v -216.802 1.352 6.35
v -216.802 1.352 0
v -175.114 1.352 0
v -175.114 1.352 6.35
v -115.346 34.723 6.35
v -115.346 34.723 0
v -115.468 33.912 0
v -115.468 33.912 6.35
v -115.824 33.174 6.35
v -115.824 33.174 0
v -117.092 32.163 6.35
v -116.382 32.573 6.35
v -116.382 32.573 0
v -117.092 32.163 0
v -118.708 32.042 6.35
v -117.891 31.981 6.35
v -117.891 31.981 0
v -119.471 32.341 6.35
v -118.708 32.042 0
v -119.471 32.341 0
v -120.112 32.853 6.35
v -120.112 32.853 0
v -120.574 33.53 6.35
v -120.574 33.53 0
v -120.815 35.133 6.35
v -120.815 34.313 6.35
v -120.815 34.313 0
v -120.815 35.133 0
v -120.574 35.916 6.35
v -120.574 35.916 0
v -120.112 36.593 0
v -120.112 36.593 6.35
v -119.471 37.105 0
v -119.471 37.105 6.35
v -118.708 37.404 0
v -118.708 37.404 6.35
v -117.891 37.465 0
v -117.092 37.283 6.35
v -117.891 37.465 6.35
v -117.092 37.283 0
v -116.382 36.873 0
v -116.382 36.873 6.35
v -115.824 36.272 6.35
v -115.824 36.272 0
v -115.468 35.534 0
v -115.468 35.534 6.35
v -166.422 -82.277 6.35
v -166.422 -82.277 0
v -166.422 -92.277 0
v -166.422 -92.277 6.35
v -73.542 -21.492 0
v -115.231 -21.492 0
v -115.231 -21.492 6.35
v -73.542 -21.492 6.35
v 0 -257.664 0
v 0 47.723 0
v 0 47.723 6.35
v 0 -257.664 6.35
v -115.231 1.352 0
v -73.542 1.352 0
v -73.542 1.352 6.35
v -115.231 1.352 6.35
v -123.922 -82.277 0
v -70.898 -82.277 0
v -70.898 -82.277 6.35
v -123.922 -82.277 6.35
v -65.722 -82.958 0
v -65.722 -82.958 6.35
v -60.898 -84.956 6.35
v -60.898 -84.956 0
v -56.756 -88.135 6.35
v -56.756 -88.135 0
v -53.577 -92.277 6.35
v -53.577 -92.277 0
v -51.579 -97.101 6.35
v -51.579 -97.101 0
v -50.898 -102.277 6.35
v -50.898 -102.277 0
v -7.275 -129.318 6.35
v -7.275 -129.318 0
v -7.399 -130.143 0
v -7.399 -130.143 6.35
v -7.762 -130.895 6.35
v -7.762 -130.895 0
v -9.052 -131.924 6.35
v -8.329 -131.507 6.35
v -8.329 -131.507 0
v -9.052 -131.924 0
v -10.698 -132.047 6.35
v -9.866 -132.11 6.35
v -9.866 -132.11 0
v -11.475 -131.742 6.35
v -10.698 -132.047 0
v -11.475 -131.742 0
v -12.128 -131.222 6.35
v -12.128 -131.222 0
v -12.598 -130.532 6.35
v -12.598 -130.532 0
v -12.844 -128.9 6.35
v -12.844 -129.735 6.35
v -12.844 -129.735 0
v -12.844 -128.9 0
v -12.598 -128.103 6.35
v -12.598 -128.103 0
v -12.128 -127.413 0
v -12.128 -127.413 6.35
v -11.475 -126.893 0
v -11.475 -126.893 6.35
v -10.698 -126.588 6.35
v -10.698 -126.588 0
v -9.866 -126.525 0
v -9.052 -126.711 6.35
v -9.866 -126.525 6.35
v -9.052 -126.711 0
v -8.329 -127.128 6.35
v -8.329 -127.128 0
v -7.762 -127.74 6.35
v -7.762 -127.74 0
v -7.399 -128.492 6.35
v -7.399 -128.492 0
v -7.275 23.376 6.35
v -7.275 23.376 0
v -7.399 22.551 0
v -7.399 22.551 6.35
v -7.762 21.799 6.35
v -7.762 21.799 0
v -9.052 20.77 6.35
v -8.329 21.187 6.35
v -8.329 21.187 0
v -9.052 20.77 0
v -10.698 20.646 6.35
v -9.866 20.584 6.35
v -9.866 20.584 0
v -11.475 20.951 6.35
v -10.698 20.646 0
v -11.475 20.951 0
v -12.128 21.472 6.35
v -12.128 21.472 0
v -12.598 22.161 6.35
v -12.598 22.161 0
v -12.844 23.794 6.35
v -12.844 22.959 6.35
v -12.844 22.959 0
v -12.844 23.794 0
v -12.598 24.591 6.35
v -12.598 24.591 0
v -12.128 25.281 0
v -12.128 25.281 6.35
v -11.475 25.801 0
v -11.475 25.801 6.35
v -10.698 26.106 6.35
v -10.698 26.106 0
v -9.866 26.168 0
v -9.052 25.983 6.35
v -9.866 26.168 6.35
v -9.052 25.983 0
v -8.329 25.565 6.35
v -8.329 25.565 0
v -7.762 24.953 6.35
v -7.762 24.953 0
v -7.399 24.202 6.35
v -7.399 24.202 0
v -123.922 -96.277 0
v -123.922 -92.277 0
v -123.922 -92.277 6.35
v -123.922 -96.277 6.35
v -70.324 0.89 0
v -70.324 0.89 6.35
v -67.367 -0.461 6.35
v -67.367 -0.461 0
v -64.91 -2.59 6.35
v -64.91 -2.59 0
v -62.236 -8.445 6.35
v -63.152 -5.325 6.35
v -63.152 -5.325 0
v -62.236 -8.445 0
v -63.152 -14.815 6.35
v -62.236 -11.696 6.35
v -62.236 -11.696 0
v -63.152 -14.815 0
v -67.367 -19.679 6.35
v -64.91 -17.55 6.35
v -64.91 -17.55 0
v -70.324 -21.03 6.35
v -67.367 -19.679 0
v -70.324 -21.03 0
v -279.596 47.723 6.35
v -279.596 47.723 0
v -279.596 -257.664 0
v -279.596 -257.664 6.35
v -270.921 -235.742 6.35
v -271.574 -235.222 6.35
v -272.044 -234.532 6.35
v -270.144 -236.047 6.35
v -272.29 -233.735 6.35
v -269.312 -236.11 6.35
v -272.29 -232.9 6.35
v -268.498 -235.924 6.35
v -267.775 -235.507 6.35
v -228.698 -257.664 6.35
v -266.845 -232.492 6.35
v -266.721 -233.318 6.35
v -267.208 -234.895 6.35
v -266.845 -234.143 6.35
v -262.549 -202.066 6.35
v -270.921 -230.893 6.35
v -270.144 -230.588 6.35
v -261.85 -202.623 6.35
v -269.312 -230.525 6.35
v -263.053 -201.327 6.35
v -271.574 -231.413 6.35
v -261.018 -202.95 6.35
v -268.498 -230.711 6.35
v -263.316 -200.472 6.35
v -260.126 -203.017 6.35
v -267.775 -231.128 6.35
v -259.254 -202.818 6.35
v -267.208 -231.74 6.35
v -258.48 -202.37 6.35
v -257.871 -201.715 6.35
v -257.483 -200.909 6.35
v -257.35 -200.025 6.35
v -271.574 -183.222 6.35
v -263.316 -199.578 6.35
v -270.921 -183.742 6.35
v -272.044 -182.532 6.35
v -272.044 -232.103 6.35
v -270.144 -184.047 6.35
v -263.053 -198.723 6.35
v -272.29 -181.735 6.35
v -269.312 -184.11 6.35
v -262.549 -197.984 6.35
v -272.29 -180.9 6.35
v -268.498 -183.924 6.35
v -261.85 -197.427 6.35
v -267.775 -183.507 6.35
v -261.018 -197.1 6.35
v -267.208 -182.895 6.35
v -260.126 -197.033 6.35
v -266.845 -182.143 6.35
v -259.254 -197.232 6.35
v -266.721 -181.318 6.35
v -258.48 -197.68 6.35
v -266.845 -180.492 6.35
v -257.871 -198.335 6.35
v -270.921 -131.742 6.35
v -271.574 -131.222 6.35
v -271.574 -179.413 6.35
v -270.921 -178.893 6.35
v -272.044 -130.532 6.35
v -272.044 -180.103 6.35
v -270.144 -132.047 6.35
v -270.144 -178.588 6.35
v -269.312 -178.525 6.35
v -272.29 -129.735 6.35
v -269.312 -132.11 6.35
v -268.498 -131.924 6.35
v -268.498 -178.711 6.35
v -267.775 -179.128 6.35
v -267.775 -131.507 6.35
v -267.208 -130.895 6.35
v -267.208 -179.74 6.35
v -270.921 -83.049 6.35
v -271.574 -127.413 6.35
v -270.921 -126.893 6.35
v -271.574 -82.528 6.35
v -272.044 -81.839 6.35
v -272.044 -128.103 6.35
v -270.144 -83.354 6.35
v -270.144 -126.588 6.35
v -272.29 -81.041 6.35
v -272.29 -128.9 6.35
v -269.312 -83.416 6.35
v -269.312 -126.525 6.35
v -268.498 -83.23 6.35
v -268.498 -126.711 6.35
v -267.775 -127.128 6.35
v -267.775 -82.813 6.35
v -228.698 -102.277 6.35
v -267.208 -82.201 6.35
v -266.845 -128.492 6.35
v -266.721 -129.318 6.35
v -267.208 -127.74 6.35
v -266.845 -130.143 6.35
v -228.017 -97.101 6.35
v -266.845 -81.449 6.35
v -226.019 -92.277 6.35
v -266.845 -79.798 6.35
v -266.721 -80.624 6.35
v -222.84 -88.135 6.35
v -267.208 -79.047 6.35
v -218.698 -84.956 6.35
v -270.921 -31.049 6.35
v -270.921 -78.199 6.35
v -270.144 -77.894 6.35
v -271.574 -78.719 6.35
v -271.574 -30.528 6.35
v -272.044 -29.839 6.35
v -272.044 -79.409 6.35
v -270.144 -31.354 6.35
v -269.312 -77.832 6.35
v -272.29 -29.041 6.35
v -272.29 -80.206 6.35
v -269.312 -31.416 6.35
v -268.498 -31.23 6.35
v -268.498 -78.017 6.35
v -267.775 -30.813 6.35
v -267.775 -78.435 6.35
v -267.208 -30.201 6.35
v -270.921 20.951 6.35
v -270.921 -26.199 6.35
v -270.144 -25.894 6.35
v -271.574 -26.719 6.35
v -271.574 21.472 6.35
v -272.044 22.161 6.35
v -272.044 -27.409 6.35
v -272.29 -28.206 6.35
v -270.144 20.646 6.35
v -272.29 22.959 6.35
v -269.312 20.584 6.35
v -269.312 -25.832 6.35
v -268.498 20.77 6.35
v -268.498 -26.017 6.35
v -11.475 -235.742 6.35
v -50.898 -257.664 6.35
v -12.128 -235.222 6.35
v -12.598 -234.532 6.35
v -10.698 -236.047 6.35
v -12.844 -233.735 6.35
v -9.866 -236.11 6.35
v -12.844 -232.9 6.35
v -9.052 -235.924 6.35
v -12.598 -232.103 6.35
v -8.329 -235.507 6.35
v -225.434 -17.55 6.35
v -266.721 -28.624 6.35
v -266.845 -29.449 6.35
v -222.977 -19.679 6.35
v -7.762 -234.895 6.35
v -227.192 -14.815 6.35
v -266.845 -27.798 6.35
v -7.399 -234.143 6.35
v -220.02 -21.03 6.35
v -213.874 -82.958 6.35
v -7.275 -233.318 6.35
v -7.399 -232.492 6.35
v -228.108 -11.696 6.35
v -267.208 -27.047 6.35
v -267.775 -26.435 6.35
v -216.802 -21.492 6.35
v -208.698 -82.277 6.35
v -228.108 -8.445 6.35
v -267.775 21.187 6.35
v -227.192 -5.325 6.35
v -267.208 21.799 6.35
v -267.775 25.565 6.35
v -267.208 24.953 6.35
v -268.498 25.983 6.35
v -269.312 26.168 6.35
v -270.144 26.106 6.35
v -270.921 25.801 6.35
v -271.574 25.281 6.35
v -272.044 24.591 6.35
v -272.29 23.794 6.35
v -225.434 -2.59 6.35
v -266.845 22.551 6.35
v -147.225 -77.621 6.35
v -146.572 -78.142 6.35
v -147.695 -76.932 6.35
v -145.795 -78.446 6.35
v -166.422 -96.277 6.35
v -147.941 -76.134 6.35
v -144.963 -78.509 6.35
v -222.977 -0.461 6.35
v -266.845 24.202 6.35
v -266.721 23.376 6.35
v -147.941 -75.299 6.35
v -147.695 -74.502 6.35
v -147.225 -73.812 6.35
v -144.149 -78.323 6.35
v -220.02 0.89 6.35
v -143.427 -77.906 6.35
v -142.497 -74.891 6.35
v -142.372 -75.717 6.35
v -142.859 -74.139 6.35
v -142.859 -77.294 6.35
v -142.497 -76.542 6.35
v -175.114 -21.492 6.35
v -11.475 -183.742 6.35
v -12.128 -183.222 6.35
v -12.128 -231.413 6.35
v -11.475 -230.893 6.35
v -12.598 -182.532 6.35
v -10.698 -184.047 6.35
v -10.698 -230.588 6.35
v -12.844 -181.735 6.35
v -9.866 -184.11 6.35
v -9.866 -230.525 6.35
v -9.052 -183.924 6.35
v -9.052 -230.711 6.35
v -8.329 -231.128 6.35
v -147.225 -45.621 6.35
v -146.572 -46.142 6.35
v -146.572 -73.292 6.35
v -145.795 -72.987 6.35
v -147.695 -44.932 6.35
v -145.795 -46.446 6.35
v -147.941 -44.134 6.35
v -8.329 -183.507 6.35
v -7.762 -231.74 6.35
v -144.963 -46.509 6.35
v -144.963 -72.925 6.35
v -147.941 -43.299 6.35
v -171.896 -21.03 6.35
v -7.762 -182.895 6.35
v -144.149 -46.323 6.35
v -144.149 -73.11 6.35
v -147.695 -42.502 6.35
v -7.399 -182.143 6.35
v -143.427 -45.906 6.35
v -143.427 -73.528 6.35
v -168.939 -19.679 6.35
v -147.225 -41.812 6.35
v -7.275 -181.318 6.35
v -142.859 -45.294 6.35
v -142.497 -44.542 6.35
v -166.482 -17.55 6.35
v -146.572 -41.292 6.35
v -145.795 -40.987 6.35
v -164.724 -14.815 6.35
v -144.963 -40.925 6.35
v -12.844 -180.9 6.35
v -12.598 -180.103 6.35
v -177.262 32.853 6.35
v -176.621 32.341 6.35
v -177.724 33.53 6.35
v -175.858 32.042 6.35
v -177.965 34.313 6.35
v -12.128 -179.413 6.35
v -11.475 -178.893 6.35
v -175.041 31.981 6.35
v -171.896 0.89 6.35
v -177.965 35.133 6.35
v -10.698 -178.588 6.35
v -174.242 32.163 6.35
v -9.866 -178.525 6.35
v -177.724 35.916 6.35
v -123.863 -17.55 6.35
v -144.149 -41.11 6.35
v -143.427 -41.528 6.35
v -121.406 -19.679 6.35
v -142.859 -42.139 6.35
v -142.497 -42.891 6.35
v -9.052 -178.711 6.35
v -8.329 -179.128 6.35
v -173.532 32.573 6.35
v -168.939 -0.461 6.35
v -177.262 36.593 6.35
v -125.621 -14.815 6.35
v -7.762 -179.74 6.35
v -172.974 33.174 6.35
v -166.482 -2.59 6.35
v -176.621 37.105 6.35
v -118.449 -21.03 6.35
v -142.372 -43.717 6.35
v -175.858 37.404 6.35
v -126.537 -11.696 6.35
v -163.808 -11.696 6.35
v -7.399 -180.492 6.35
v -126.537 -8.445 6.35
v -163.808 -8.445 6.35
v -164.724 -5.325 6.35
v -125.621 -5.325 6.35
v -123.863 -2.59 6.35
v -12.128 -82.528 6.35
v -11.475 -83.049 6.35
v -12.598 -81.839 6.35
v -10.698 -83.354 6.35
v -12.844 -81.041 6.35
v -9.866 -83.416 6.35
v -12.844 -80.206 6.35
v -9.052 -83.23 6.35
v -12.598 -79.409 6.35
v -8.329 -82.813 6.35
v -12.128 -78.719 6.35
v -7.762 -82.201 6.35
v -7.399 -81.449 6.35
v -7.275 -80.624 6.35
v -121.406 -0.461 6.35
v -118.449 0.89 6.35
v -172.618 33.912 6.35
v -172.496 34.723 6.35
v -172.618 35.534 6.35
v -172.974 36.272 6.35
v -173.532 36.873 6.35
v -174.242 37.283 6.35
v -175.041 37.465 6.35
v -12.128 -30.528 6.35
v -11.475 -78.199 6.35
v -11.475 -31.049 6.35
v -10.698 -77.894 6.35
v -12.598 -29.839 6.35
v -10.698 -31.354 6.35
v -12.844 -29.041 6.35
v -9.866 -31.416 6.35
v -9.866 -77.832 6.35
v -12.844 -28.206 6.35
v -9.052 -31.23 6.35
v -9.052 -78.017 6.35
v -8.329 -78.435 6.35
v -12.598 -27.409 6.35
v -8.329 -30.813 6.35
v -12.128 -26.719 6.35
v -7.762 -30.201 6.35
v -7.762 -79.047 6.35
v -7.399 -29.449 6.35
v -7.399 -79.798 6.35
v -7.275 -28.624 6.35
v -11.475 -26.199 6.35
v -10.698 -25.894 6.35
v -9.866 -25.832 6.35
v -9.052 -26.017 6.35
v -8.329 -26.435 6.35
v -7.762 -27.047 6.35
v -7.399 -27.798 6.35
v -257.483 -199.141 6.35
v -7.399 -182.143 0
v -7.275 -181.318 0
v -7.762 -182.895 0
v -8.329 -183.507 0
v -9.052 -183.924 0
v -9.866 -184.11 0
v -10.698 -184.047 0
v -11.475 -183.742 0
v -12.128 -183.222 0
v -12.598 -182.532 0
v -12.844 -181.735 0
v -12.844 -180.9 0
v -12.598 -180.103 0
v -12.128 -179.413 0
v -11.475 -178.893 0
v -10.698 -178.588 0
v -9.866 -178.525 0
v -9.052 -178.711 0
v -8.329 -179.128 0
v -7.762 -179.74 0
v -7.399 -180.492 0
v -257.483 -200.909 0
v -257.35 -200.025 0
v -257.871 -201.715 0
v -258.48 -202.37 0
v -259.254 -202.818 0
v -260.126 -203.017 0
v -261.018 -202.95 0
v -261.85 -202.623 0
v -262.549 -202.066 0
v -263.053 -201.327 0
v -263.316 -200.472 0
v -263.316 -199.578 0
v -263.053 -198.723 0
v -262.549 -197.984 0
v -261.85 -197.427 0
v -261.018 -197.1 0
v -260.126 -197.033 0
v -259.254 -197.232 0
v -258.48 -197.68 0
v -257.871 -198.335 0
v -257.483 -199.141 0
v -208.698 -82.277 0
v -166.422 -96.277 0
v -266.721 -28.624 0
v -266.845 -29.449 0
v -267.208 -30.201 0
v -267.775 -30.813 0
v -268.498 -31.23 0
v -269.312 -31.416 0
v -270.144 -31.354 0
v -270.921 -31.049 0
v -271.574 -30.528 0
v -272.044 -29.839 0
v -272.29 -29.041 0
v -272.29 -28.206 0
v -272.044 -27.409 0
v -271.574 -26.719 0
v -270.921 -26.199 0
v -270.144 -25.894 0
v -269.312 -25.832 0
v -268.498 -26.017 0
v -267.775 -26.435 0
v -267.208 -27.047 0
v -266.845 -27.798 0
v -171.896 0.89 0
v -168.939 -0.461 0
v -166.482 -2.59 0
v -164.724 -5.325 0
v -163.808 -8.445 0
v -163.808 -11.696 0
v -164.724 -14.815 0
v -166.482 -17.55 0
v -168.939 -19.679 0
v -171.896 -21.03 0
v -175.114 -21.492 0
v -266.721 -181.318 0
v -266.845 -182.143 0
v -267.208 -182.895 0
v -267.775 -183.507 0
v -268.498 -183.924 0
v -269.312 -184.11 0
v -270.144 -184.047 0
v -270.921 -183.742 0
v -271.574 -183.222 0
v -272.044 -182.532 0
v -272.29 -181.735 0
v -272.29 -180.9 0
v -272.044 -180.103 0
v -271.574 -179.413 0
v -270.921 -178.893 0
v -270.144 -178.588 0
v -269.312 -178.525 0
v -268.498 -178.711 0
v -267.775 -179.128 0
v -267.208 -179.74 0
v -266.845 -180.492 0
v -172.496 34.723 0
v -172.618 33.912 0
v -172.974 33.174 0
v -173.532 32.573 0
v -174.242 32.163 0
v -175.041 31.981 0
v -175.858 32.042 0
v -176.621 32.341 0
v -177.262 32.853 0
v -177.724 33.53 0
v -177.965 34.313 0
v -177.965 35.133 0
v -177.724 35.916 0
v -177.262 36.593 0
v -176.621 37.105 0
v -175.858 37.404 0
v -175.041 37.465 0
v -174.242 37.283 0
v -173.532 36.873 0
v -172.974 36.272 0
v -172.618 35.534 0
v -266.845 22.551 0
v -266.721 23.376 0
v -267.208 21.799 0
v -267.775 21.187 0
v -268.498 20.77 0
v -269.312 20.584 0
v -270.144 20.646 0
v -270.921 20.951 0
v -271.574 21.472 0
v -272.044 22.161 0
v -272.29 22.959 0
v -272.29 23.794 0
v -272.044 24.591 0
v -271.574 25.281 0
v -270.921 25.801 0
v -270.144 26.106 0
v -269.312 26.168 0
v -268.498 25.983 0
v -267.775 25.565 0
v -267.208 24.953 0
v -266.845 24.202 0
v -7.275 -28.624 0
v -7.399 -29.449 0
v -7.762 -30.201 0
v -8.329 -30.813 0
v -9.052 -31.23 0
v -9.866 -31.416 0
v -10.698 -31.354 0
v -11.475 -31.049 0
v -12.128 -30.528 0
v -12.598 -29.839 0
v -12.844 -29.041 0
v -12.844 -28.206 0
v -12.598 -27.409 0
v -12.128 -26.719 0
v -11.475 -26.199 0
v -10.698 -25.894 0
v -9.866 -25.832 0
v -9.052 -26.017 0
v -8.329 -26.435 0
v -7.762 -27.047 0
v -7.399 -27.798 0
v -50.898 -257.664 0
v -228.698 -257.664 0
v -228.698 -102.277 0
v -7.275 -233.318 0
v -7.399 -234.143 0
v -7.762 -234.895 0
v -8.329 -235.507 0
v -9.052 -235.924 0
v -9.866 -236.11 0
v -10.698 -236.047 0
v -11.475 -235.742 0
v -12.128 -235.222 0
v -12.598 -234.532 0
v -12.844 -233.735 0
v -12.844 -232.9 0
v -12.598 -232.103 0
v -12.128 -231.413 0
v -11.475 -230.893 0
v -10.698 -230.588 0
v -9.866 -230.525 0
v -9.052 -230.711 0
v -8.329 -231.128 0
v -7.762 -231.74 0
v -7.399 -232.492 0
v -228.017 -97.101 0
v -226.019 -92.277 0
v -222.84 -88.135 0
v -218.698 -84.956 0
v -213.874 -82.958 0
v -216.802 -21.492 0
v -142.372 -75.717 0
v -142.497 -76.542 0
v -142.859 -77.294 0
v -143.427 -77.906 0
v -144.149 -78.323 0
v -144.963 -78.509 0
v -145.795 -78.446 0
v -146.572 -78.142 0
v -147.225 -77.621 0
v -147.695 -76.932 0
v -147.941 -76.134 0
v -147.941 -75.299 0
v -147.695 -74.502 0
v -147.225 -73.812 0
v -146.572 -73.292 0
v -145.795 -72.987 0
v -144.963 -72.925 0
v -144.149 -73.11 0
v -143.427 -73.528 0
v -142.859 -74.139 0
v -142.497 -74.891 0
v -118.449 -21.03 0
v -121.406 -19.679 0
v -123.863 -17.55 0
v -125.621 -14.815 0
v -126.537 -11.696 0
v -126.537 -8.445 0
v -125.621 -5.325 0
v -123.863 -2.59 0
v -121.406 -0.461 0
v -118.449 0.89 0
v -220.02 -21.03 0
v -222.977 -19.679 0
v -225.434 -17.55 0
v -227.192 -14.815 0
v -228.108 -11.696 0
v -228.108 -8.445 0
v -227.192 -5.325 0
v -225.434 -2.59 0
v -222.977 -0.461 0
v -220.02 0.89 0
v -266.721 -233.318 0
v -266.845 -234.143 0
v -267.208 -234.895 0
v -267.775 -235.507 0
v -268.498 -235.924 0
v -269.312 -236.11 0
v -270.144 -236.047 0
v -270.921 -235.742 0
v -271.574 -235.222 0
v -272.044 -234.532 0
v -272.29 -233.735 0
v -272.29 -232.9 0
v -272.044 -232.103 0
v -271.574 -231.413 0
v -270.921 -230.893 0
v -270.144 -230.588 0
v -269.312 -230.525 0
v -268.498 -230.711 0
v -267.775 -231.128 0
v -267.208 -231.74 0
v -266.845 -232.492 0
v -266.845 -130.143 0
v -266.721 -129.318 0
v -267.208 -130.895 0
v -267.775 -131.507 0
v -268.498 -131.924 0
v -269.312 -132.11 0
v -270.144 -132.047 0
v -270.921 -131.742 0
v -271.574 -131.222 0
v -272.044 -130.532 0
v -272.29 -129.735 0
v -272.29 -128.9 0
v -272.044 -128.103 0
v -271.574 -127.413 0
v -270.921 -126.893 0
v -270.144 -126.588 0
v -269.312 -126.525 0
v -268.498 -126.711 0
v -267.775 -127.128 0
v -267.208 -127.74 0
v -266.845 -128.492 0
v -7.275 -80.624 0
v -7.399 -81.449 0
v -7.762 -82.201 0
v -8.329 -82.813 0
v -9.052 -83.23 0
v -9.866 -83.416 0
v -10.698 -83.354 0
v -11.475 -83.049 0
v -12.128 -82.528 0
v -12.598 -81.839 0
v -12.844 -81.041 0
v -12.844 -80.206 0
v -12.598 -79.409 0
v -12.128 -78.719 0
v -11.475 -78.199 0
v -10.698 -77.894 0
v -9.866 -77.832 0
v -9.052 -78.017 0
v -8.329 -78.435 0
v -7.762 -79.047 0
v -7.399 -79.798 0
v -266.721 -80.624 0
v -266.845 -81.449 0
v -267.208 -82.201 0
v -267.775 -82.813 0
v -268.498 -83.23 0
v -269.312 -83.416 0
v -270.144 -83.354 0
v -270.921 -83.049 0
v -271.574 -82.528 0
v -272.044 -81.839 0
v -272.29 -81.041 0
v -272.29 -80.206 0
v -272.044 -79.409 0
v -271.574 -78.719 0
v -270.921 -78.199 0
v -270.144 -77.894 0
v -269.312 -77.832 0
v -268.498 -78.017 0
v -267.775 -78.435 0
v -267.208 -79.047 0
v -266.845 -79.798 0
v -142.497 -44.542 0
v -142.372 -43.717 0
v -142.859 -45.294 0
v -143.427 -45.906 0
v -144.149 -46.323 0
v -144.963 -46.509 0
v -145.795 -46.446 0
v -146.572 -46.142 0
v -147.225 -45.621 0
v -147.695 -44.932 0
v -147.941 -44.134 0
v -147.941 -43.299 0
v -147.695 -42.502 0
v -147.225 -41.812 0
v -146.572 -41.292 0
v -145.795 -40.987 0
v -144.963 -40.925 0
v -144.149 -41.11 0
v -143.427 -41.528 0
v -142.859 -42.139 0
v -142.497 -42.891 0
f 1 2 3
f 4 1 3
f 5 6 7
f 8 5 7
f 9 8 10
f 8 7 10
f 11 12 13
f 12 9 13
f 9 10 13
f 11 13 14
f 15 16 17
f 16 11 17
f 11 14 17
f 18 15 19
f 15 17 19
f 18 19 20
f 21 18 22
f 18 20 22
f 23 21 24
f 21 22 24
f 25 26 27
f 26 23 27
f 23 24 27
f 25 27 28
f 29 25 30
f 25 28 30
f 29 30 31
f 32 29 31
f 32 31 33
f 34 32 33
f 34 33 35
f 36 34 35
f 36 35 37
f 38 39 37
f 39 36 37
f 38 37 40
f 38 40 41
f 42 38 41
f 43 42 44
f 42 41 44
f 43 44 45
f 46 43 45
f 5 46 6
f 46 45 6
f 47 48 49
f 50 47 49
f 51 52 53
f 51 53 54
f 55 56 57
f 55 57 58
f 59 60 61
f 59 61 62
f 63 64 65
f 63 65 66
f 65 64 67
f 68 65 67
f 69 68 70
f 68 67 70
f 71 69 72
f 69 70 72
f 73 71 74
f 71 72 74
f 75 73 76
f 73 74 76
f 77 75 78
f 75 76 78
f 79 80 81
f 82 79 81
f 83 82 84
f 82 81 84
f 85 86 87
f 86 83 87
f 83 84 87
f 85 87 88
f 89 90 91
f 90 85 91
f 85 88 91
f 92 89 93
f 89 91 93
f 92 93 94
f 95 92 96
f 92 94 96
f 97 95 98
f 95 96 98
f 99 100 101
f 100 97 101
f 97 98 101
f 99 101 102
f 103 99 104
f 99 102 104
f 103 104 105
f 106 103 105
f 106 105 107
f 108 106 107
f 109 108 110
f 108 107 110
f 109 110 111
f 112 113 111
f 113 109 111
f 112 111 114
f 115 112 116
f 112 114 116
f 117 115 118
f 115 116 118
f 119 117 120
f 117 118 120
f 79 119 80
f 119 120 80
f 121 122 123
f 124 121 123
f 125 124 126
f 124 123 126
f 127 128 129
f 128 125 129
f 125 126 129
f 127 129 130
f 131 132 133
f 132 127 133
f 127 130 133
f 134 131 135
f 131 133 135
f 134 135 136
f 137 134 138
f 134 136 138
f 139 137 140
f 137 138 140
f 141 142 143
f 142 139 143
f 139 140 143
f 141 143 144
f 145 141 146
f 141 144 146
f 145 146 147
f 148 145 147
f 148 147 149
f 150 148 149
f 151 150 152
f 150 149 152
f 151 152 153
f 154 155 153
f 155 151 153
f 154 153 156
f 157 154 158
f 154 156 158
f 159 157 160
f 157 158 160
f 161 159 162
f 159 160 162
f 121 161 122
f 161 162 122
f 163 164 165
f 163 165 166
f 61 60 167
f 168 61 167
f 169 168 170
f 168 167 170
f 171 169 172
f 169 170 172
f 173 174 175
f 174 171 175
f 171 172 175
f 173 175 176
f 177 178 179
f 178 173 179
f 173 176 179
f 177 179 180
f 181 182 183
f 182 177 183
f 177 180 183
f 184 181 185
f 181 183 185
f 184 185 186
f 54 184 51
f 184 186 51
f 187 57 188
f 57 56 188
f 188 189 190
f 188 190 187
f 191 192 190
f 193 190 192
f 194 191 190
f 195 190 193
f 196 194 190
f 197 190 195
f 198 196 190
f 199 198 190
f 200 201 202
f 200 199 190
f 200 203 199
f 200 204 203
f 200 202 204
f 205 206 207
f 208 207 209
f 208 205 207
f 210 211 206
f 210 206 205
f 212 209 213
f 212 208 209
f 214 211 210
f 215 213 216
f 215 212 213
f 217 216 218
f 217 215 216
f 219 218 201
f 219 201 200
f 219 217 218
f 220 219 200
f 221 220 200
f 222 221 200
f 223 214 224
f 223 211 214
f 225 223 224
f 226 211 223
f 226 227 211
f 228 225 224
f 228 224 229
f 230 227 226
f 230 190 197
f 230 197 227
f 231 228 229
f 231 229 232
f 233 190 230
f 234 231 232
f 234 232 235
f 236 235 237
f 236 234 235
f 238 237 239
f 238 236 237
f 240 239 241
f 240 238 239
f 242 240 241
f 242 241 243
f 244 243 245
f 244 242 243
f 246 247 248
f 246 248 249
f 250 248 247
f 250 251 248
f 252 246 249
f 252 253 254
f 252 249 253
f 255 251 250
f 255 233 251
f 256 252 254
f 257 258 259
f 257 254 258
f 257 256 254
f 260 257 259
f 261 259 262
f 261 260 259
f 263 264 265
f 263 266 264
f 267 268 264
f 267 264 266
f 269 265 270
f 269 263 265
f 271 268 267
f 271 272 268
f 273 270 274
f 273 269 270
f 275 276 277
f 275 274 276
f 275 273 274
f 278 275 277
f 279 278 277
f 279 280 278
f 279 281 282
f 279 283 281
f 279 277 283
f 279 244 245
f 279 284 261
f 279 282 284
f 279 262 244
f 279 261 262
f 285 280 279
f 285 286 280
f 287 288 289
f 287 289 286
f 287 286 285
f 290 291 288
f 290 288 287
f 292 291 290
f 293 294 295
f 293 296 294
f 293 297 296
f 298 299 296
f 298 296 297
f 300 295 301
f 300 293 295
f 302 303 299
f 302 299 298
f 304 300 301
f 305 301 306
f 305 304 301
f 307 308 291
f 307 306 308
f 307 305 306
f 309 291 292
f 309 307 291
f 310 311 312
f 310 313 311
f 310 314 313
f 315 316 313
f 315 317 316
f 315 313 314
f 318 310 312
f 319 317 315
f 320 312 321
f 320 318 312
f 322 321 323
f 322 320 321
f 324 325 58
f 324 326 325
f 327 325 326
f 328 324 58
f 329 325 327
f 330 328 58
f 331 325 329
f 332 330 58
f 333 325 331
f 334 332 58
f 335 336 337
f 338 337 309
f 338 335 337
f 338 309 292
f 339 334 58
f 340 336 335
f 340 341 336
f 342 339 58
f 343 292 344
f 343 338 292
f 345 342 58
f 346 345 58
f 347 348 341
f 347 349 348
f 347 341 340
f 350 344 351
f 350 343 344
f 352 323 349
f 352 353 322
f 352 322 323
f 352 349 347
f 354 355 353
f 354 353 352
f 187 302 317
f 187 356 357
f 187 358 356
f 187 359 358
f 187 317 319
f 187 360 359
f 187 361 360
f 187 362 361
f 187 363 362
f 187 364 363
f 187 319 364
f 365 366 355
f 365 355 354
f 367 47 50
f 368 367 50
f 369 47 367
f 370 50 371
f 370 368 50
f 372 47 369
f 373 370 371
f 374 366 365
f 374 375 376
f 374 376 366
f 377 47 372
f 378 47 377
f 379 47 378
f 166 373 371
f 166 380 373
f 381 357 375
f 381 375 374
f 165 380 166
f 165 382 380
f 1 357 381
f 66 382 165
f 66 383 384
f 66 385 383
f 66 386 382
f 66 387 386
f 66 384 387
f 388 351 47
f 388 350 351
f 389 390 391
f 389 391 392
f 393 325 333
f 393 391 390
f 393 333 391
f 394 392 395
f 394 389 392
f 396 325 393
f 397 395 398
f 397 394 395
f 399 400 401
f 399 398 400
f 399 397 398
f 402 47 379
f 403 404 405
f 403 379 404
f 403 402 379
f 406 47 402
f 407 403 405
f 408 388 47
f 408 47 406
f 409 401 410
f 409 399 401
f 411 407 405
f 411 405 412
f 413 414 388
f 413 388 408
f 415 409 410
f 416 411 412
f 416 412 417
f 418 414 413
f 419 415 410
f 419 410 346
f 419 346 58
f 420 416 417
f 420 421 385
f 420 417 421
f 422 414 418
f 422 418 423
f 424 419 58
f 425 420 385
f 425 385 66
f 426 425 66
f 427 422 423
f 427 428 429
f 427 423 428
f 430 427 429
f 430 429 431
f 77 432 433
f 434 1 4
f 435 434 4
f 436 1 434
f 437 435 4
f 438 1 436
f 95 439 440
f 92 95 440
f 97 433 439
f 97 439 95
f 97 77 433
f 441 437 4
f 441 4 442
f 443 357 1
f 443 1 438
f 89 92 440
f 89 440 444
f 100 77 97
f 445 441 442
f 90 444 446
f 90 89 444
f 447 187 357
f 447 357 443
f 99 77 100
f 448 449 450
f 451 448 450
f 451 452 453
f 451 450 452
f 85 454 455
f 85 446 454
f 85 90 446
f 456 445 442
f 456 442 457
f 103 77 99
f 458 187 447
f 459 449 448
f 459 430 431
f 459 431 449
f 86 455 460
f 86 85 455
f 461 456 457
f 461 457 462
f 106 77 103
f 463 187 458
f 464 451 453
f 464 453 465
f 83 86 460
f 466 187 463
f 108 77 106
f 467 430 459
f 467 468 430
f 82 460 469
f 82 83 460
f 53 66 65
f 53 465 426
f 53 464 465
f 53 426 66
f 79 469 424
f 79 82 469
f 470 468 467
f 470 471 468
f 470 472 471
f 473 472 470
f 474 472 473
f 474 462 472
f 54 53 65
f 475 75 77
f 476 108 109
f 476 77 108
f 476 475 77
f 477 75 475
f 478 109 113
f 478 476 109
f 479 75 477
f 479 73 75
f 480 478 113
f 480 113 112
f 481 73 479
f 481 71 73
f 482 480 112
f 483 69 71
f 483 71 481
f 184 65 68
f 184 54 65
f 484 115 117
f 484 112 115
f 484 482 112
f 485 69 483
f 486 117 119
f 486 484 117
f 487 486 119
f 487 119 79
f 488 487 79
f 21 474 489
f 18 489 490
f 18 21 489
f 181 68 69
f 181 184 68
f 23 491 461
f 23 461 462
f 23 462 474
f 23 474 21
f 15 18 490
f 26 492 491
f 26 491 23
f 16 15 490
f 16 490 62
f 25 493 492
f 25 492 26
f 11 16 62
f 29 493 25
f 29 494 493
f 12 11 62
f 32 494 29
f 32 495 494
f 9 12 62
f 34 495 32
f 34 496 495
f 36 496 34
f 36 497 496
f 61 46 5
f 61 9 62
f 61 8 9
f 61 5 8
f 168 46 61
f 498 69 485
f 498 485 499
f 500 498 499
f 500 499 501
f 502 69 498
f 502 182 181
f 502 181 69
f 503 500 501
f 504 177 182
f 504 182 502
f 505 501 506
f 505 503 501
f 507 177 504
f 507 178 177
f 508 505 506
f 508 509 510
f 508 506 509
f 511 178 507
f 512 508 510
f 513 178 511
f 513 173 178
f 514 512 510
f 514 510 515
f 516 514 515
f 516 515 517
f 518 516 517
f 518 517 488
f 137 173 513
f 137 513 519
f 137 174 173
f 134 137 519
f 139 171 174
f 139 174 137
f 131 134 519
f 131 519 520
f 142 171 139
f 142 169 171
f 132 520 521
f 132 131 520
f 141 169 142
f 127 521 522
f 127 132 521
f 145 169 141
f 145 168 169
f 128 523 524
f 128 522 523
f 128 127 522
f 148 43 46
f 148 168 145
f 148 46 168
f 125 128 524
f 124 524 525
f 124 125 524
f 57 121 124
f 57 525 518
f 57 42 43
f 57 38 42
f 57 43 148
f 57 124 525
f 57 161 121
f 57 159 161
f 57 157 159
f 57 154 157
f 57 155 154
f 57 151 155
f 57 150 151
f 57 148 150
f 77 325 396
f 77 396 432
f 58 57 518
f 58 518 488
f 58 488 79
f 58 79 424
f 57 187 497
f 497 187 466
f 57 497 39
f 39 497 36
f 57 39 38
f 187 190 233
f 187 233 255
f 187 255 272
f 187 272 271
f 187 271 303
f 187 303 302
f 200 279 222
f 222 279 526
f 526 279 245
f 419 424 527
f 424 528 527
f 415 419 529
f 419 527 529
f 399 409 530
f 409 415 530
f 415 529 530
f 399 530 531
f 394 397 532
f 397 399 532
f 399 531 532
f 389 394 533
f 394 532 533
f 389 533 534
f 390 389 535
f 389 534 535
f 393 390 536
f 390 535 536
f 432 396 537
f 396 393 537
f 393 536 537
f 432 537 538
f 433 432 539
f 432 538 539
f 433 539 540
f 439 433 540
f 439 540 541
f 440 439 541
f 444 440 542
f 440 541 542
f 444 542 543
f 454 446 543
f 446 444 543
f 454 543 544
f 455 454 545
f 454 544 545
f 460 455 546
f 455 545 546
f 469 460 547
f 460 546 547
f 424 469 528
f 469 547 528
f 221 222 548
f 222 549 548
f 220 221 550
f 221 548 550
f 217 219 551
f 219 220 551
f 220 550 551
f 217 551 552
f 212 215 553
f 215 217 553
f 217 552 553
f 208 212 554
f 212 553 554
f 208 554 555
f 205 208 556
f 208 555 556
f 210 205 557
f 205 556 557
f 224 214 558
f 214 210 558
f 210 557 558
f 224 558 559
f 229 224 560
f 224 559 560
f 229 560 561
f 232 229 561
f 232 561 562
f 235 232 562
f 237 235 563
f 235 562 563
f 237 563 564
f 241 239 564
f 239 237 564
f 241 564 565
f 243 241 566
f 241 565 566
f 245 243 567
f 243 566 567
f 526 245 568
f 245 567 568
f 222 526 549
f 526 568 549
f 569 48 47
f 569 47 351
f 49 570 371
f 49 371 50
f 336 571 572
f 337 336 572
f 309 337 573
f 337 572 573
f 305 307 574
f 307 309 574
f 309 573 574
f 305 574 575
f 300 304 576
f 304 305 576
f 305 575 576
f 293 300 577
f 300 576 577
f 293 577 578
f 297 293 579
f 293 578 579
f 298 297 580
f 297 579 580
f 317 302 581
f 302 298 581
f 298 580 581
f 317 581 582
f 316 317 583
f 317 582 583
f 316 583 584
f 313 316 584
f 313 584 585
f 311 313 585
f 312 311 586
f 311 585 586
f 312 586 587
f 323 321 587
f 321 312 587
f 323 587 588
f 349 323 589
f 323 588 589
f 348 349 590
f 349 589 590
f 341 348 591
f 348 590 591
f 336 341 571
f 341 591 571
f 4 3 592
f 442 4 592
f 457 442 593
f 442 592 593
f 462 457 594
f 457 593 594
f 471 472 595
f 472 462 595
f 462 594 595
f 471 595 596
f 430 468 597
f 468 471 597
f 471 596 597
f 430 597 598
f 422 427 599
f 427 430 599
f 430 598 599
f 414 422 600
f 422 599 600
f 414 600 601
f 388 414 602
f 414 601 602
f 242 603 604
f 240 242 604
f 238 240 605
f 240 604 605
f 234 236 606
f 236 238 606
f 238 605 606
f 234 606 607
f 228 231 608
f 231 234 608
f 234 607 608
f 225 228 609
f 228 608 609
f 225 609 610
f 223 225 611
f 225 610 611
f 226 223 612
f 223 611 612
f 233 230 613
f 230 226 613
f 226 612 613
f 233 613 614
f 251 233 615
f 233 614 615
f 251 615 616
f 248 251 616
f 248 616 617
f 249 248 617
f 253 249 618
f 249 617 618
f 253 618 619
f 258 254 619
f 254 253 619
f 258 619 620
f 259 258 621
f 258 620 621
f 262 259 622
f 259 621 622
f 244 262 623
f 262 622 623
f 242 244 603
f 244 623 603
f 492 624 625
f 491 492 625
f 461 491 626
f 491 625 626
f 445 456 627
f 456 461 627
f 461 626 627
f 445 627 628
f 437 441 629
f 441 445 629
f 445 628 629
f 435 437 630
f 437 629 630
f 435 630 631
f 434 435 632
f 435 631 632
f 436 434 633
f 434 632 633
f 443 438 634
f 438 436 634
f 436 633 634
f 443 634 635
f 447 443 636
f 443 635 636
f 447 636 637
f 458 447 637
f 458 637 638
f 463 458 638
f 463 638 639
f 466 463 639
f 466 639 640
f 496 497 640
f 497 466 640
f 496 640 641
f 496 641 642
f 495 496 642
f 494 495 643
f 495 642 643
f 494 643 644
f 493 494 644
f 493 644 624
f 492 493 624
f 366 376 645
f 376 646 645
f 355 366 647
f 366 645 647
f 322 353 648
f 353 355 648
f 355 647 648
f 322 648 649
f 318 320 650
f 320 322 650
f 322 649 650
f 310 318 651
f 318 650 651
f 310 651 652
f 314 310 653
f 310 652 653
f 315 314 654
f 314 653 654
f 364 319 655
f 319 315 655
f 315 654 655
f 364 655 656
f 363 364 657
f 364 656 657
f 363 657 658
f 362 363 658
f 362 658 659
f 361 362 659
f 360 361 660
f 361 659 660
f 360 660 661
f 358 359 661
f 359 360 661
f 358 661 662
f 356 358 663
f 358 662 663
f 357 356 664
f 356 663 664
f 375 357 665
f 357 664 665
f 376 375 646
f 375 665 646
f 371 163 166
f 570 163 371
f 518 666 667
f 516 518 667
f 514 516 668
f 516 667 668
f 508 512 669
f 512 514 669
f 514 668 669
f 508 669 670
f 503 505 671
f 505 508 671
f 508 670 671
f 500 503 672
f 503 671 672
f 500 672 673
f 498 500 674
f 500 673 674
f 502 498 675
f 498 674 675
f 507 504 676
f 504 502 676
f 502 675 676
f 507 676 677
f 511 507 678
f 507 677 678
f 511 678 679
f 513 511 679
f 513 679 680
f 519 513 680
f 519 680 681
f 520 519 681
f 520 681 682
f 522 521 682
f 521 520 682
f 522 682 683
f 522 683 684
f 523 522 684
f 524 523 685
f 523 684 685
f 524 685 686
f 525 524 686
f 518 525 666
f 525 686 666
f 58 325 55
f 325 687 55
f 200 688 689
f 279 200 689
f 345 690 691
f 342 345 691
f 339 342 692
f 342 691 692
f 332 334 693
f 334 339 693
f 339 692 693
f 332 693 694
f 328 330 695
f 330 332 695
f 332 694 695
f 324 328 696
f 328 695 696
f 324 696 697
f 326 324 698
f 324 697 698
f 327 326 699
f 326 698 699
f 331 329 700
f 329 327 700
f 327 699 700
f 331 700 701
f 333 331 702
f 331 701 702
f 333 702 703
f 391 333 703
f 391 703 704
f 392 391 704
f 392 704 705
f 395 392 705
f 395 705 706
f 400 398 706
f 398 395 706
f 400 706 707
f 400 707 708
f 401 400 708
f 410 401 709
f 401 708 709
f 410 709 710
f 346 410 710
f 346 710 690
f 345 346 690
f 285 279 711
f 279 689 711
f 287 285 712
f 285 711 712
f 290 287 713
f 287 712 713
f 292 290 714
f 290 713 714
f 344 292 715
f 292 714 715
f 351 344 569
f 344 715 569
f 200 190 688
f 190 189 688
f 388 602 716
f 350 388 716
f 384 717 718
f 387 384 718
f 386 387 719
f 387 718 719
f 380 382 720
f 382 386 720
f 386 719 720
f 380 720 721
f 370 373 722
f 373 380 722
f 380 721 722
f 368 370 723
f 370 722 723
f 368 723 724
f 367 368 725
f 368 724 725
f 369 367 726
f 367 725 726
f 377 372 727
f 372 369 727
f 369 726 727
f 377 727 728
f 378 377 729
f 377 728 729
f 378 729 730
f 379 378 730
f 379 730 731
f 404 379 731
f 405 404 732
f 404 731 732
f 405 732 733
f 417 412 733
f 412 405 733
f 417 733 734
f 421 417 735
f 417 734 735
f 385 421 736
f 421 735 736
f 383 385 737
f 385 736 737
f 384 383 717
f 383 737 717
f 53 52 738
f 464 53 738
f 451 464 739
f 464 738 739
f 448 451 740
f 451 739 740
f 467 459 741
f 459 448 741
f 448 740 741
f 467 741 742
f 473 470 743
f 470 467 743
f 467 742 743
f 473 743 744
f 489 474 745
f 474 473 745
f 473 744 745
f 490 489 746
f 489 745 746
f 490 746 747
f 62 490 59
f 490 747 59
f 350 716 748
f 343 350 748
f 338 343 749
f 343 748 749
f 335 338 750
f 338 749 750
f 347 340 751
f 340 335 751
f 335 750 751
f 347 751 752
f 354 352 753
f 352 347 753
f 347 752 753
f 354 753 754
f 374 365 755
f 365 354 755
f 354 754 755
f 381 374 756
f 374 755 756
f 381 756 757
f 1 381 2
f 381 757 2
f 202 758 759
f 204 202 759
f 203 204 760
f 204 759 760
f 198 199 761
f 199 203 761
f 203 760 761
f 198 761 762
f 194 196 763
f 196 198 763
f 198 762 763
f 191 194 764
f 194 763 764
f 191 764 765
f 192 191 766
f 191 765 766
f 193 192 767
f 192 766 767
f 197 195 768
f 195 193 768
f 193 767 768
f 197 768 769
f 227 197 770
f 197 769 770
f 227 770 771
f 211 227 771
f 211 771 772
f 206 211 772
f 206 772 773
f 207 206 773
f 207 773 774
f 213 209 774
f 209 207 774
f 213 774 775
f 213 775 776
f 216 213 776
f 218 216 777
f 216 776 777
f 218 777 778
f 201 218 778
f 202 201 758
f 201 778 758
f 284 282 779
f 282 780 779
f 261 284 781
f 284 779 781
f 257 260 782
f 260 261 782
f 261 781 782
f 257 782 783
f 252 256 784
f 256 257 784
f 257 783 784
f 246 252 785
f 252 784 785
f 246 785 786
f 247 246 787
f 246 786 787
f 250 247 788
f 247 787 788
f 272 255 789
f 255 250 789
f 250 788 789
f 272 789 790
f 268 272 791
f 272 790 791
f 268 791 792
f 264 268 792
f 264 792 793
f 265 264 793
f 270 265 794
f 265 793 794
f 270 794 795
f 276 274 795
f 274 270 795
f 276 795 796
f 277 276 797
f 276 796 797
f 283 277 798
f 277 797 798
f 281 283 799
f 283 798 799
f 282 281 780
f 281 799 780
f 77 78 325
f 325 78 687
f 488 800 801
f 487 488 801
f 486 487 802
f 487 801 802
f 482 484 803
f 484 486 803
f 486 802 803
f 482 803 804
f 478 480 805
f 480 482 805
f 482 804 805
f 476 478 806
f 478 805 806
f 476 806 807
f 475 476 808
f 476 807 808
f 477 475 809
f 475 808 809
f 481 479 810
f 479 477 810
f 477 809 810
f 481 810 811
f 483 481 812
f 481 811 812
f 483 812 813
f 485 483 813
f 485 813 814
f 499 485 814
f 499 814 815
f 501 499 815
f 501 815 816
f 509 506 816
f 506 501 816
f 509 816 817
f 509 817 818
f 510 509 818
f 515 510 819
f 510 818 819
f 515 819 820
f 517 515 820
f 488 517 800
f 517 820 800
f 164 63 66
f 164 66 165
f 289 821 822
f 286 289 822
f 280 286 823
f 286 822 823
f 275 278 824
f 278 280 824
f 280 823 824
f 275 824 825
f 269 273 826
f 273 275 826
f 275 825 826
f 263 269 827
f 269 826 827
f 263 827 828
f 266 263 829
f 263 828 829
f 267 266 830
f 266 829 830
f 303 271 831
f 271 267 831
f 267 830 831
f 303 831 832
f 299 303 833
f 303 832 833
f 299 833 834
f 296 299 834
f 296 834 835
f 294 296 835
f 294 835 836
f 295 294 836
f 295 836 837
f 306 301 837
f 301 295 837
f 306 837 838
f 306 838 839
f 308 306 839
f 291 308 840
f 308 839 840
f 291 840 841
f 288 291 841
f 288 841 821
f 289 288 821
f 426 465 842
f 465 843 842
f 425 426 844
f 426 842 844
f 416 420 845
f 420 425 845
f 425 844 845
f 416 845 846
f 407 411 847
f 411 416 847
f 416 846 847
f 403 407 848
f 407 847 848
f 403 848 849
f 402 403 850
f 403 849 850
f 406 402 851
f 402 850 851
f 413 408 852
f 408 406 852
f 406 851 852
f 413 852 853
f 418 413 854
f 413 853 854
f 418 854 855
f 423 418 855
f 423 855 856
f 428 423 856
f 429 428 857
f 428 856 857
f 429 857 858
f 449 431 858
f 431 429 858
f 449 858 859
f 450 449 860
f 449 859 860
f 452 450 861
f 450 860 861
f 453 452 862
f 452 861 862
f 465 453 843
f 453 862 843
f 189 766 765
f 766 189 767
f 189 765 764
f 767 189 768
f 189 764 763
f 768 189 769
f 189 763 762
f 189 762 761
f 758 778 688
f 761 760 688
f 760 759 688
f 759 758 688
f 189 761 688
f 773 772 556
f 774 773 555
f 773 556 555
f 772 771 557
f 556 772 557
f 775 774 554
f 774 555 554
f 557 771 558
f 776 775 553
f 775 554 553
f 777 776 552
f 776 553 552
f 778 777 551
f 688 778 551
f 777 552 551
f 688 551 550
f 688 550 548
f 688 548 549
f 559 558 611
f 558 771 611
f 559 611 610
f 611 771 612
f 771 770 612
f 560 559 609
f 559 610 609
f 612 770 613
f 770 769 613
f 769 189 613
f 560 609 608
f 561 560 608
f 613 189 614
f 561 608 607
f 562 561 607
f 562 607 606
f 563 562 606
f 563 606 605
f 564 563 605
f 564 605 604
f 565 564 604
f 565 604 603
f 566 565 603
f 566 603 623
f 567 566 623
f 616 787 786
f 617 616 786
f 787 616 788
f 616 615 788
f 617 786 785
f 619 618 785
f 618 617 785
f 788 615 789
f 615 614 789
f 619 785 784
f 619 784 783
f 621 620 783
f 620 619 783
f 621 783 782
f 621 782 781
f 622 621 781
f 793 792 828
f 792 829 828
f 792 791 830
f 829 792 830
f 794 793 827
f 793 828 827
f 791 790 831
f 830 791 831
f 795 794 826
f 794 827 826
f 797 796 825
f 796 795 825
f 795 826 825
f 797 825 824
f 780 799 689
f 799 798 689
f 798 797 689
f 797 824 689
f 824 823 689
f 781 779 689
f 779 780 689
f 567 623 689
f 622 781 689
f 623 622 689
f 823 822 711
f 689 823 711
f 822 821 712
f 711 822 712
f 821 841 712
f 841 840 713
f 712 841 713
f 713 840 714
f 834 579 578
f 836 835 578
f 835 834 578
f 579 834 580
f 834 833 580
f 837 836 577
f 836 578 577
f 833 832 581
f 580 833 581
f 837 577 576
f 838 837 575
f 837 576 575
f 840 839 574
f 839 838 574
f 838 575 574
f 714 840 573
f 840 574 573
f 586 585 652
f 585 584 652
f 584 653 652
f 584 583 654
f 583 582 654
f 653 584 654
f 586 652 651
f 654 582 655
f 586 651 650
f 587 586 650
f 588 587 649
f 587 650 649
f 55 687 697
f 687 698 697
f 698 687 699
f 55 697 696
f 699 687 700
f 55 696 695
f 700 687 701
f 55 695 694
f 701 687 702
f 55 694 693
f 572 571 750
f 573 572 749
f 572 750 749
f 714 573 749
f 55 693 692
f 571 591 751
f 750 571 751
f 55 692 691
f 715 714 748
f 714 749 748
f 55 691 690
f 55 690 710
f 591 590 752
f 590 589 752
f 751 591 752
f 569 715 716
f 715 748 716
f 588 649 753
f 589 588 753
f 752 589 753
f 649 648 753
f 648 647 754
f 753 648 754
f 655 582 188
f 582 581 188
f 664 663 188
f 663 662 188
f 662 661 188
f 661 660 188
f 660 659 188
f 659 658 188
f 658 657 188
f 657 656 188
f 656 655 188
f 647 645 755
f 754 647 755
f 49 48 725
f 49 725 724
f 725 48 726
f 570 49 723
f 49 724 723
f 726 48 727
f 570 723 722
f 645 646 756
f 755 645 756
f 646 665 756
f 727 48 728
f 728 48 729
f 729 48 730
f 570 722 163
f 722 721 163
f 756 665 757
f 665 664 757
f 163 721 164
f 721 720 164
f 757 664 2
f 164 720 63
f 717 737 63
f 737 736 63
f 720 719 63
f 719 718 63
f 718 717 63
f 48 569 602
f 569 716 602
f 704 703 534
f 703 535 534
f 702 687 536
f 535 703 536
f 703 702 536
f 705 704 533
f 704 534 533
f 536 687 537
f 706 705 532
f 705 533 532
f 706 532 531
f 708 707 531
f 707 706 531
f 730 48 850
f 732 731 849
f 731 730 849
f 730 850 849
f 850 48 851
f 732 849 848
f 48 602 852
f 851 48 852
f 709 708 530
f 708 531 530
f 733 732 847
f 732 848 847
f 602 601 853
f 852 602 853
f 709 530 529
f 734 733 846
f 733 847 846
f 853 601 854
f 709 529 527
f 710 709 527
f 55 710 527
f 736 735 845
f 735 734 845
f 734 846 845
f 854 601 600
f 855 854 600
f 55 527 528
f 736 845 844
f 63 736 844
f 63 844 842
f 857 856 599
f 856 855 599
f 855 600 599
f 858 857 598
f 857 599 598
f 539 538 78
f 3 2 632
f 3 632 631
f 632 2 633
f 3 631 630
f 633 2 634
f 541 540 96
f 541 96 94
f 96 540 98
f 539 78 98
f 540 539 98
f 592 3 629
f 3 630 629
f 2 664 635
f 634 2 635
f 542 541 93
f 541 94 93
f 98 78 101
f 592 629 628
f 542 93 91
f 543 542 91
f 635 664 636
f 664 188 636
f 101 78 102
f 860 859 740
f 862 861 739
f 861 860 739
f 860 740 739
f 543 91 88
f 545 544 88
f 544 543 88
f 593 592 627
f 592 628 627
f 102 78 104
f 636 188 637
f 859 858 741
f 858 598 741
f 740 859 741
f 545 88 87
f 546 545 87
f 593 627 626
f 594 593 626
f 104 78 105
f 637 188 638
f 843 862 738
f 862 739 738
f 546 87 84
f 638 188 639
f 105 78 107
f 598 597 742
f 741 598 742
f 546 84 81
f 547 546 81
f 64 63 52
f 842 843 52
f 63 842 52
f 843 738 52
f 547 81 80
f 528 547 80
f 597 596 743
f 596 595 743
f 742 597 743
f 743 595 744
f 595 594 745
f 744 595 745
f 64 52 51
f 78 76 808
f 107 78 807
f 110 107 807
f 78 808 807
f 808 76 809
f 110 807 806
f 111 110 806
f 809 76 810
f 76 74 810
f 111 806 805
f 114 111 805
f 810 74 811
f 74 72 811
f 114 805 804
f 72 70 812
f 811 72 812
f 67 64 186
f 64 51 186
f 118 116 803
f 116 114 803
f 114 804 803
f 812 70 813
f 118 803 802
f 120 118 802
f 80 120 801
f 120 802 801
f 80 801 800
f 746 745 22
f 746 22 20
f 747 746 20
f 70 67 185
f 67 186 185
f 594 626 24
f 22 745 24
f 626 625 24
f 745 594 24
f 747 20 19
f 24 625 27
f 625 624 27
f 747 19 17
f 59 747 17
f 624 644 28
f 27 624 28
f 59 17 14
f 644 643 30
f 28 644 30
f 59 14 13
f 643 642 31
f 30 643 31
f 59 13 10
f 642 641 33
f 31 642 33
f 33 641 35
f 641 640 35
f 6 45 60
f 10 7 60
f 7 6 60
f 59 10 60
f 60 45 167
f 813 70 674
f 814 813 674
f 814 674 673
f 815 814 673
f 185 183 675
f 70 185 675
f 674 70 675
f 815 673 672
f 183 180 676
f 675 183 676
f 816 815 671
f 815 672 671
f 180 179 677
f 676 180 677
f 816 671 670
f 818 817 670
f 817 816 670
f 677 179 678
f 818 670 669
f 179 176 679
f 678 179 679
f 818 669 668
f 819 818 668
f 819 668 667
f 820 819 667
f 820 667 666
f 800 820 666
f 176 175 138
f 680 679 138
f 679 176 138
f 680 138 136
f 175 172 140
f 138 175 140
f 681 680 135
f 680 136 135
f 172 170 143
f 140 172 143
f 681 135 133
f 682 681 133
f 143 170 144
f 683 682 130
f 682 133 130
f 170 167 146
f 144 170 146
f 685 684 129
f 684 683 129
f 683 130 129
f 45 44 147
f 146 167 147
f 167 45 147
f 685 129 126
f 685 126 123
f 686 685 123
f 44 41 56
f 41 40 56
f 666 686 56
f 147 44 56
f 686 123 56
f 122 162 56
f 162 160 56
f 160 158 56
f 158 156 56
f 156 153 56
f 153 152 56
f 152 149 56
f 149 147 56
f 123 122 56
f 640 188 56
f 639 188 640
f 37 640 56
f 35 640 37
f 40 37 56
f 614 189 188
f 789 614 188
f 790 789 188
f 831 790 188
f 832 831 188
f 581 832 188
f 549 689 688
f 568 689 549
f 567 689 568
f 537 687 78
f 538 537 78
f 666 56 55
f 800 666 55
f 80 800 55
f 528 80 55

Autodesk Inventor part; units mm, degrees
ref_plane "YZ Plane" through (0, 0, 0) normal (1, 0, 0) x (0, 1, 0)
ref_plane "XZ Plane" through (0, 0, 0) normal (0, 1, 0) x (-1, 0, 0)
ref_plane "XY Plane" through (0, 0, 0) normal (0, 0, 1) x (1, 0, 0)
sketch "Sketch1" plane through (0, 0, 0) normal (0, 0, 1) x (1, 0, 0)
  circle A0 centre (-10.075, 23.3762) radius 2.8
  circle A1 centre (-10.075, -28.6238) radius 2.8
  circle A2 centre (-10.075, -80.6238) radius 2.8
  circle A3 centre (-10.075, -129.3175) radius 2.8
  circle A4 centre (-10.075, -181.3175) radius 2.8
  circle A5 centre (-10.075, -233.3175) radius 2.8
  circle A6 centre (-269.521, -233.3175) radius 2.8
  circle A7 centre (-269.521, -181.3175) radius 2.8
  circle A8 centre (-269.521, -129.3175) radius 2.8
  circle A9 centre (-269.521, -80.6238) radius 2.8
  circle A10 centre (-269.521, -28.6238) radius 2.8
  circle A11 centre (-269.521, 23.3762) radius 2.8
  line L0 (-279.596, -257.6643) -> (-279.596, 47.723)
  line L1 (0, 47.723) -> (0, -257.6643)
  line L2 (-50.898, -102.277) -> (-50.898, -257.6643)
  line L3 (-228.698, -257.6643) -> (-228.698, -102.277)
  line L4 (0, 47.723) -> (-279.596, 47.723)
  line L5 (-279.596, -257.6643) -> (-228.698, -257.6643)
  line L6 (-50.898, -257.6643) -> (0, -257.6643)
  circle A12 centre (-145.1723, -43.7167) radius 2.8
  circle A13 centre (-175.2462, 34.723) radius 2.75
  circle A14 centre (-118.0962, 34.723) radius 2.75
  circle A15 centre (-260.35, -200.025) radius 3
  line L7 (-123.9223, -92.277) -> (-123.9223, -96.277)
  line L8 (-166.4223, -96.277) -> (-166.4223, -92.277)
  circle A16 centre (-145.1723, -75.7167) radius 2.8
  line L9 (-145.1723, -75.7167) -> (-145.1723, -72.9167) construction
  line L10 (-145.1723, -46.5167) -> (-145.1723, 47.723) construction
  line L11 (-123.9223, -82.277) -> (-123.9223, -92.277)
  line L12 (-166.4223, -82.277) -> (-166.4223, -92.277)
  line L13 (-70.898, -82.277) -> (-123.9223, -82.277)
  line L14 (-166.4223, -82.277) -> (-208.698, -82.277)
  line L15 (-123.9223, -96.277) -> (-166.4223, -96.277)
  line L16 (-73.5425, -10.0701) -> (-115.2306, -10.0701) construction
  line L17 (-73.5425, 1.3522) -> (-115.2306, 1.3522)
  line L18 (-115.2306, -21.4924) -> (-73.5425, -21.4924)
  arc A17 (-73.5425, -21.4924) -> (-73.5425, 1.3522) centre (-73.5425, -10.0701) ccw
  arc A18 (-115.2306, 1.3522) -> (-115.2306, -21.4924) centre (-115.2306, -10.0701) ccw
  line L19 (-216.8021, -10.0701) -> (-175.1139, -10.0701) construction
  line L20 (-216.8021, 1.3522) -> (-175.1139, 1.3522)
  line L21 (-175.1139, -21.4924) -> (-216.8021, -21.4924)
  arc A19 (-216.8021, 1.3522) -> (-216.8021, -21.4924) centre (-216.8021, -10.0701) ccw
  arc A20 (-175.1139, -21.4924) -> (-175.1139, 1.3522) centre (-175.1139, -10.0701) ccw
  arc A21 (-50.898, -102.277) -> (-70.898, -82.277) centre (-70.898, -102.277) ccw
  arc A22 (-208.698, -82.277) -> (-228.698, -102.277) centre (-208.698, -102.277) ccw
  point P0 (-50.898, -82.277)
  point P1 (-228.698, -82.277)
  point P2 (-94.3865, -10.0701)
  point P3 (-195.958, -10.0701)
  dimension "d12" = 5.6
  dimension "d13" = 5.6
  dimension "d2" = 305.3873
  dimension "d3" = 279.596
  dimension "d7" = 5.5
  dimension "d14" = 32
  dimension "d16" = 94.2398
  dimension "d22" = 20
extrude "Extrusion1" add sketch "Sketch1" along normal blind 6.35
properties part number "Mech Chassis v7 deckipt" material "Polycarbonate, Clear"
